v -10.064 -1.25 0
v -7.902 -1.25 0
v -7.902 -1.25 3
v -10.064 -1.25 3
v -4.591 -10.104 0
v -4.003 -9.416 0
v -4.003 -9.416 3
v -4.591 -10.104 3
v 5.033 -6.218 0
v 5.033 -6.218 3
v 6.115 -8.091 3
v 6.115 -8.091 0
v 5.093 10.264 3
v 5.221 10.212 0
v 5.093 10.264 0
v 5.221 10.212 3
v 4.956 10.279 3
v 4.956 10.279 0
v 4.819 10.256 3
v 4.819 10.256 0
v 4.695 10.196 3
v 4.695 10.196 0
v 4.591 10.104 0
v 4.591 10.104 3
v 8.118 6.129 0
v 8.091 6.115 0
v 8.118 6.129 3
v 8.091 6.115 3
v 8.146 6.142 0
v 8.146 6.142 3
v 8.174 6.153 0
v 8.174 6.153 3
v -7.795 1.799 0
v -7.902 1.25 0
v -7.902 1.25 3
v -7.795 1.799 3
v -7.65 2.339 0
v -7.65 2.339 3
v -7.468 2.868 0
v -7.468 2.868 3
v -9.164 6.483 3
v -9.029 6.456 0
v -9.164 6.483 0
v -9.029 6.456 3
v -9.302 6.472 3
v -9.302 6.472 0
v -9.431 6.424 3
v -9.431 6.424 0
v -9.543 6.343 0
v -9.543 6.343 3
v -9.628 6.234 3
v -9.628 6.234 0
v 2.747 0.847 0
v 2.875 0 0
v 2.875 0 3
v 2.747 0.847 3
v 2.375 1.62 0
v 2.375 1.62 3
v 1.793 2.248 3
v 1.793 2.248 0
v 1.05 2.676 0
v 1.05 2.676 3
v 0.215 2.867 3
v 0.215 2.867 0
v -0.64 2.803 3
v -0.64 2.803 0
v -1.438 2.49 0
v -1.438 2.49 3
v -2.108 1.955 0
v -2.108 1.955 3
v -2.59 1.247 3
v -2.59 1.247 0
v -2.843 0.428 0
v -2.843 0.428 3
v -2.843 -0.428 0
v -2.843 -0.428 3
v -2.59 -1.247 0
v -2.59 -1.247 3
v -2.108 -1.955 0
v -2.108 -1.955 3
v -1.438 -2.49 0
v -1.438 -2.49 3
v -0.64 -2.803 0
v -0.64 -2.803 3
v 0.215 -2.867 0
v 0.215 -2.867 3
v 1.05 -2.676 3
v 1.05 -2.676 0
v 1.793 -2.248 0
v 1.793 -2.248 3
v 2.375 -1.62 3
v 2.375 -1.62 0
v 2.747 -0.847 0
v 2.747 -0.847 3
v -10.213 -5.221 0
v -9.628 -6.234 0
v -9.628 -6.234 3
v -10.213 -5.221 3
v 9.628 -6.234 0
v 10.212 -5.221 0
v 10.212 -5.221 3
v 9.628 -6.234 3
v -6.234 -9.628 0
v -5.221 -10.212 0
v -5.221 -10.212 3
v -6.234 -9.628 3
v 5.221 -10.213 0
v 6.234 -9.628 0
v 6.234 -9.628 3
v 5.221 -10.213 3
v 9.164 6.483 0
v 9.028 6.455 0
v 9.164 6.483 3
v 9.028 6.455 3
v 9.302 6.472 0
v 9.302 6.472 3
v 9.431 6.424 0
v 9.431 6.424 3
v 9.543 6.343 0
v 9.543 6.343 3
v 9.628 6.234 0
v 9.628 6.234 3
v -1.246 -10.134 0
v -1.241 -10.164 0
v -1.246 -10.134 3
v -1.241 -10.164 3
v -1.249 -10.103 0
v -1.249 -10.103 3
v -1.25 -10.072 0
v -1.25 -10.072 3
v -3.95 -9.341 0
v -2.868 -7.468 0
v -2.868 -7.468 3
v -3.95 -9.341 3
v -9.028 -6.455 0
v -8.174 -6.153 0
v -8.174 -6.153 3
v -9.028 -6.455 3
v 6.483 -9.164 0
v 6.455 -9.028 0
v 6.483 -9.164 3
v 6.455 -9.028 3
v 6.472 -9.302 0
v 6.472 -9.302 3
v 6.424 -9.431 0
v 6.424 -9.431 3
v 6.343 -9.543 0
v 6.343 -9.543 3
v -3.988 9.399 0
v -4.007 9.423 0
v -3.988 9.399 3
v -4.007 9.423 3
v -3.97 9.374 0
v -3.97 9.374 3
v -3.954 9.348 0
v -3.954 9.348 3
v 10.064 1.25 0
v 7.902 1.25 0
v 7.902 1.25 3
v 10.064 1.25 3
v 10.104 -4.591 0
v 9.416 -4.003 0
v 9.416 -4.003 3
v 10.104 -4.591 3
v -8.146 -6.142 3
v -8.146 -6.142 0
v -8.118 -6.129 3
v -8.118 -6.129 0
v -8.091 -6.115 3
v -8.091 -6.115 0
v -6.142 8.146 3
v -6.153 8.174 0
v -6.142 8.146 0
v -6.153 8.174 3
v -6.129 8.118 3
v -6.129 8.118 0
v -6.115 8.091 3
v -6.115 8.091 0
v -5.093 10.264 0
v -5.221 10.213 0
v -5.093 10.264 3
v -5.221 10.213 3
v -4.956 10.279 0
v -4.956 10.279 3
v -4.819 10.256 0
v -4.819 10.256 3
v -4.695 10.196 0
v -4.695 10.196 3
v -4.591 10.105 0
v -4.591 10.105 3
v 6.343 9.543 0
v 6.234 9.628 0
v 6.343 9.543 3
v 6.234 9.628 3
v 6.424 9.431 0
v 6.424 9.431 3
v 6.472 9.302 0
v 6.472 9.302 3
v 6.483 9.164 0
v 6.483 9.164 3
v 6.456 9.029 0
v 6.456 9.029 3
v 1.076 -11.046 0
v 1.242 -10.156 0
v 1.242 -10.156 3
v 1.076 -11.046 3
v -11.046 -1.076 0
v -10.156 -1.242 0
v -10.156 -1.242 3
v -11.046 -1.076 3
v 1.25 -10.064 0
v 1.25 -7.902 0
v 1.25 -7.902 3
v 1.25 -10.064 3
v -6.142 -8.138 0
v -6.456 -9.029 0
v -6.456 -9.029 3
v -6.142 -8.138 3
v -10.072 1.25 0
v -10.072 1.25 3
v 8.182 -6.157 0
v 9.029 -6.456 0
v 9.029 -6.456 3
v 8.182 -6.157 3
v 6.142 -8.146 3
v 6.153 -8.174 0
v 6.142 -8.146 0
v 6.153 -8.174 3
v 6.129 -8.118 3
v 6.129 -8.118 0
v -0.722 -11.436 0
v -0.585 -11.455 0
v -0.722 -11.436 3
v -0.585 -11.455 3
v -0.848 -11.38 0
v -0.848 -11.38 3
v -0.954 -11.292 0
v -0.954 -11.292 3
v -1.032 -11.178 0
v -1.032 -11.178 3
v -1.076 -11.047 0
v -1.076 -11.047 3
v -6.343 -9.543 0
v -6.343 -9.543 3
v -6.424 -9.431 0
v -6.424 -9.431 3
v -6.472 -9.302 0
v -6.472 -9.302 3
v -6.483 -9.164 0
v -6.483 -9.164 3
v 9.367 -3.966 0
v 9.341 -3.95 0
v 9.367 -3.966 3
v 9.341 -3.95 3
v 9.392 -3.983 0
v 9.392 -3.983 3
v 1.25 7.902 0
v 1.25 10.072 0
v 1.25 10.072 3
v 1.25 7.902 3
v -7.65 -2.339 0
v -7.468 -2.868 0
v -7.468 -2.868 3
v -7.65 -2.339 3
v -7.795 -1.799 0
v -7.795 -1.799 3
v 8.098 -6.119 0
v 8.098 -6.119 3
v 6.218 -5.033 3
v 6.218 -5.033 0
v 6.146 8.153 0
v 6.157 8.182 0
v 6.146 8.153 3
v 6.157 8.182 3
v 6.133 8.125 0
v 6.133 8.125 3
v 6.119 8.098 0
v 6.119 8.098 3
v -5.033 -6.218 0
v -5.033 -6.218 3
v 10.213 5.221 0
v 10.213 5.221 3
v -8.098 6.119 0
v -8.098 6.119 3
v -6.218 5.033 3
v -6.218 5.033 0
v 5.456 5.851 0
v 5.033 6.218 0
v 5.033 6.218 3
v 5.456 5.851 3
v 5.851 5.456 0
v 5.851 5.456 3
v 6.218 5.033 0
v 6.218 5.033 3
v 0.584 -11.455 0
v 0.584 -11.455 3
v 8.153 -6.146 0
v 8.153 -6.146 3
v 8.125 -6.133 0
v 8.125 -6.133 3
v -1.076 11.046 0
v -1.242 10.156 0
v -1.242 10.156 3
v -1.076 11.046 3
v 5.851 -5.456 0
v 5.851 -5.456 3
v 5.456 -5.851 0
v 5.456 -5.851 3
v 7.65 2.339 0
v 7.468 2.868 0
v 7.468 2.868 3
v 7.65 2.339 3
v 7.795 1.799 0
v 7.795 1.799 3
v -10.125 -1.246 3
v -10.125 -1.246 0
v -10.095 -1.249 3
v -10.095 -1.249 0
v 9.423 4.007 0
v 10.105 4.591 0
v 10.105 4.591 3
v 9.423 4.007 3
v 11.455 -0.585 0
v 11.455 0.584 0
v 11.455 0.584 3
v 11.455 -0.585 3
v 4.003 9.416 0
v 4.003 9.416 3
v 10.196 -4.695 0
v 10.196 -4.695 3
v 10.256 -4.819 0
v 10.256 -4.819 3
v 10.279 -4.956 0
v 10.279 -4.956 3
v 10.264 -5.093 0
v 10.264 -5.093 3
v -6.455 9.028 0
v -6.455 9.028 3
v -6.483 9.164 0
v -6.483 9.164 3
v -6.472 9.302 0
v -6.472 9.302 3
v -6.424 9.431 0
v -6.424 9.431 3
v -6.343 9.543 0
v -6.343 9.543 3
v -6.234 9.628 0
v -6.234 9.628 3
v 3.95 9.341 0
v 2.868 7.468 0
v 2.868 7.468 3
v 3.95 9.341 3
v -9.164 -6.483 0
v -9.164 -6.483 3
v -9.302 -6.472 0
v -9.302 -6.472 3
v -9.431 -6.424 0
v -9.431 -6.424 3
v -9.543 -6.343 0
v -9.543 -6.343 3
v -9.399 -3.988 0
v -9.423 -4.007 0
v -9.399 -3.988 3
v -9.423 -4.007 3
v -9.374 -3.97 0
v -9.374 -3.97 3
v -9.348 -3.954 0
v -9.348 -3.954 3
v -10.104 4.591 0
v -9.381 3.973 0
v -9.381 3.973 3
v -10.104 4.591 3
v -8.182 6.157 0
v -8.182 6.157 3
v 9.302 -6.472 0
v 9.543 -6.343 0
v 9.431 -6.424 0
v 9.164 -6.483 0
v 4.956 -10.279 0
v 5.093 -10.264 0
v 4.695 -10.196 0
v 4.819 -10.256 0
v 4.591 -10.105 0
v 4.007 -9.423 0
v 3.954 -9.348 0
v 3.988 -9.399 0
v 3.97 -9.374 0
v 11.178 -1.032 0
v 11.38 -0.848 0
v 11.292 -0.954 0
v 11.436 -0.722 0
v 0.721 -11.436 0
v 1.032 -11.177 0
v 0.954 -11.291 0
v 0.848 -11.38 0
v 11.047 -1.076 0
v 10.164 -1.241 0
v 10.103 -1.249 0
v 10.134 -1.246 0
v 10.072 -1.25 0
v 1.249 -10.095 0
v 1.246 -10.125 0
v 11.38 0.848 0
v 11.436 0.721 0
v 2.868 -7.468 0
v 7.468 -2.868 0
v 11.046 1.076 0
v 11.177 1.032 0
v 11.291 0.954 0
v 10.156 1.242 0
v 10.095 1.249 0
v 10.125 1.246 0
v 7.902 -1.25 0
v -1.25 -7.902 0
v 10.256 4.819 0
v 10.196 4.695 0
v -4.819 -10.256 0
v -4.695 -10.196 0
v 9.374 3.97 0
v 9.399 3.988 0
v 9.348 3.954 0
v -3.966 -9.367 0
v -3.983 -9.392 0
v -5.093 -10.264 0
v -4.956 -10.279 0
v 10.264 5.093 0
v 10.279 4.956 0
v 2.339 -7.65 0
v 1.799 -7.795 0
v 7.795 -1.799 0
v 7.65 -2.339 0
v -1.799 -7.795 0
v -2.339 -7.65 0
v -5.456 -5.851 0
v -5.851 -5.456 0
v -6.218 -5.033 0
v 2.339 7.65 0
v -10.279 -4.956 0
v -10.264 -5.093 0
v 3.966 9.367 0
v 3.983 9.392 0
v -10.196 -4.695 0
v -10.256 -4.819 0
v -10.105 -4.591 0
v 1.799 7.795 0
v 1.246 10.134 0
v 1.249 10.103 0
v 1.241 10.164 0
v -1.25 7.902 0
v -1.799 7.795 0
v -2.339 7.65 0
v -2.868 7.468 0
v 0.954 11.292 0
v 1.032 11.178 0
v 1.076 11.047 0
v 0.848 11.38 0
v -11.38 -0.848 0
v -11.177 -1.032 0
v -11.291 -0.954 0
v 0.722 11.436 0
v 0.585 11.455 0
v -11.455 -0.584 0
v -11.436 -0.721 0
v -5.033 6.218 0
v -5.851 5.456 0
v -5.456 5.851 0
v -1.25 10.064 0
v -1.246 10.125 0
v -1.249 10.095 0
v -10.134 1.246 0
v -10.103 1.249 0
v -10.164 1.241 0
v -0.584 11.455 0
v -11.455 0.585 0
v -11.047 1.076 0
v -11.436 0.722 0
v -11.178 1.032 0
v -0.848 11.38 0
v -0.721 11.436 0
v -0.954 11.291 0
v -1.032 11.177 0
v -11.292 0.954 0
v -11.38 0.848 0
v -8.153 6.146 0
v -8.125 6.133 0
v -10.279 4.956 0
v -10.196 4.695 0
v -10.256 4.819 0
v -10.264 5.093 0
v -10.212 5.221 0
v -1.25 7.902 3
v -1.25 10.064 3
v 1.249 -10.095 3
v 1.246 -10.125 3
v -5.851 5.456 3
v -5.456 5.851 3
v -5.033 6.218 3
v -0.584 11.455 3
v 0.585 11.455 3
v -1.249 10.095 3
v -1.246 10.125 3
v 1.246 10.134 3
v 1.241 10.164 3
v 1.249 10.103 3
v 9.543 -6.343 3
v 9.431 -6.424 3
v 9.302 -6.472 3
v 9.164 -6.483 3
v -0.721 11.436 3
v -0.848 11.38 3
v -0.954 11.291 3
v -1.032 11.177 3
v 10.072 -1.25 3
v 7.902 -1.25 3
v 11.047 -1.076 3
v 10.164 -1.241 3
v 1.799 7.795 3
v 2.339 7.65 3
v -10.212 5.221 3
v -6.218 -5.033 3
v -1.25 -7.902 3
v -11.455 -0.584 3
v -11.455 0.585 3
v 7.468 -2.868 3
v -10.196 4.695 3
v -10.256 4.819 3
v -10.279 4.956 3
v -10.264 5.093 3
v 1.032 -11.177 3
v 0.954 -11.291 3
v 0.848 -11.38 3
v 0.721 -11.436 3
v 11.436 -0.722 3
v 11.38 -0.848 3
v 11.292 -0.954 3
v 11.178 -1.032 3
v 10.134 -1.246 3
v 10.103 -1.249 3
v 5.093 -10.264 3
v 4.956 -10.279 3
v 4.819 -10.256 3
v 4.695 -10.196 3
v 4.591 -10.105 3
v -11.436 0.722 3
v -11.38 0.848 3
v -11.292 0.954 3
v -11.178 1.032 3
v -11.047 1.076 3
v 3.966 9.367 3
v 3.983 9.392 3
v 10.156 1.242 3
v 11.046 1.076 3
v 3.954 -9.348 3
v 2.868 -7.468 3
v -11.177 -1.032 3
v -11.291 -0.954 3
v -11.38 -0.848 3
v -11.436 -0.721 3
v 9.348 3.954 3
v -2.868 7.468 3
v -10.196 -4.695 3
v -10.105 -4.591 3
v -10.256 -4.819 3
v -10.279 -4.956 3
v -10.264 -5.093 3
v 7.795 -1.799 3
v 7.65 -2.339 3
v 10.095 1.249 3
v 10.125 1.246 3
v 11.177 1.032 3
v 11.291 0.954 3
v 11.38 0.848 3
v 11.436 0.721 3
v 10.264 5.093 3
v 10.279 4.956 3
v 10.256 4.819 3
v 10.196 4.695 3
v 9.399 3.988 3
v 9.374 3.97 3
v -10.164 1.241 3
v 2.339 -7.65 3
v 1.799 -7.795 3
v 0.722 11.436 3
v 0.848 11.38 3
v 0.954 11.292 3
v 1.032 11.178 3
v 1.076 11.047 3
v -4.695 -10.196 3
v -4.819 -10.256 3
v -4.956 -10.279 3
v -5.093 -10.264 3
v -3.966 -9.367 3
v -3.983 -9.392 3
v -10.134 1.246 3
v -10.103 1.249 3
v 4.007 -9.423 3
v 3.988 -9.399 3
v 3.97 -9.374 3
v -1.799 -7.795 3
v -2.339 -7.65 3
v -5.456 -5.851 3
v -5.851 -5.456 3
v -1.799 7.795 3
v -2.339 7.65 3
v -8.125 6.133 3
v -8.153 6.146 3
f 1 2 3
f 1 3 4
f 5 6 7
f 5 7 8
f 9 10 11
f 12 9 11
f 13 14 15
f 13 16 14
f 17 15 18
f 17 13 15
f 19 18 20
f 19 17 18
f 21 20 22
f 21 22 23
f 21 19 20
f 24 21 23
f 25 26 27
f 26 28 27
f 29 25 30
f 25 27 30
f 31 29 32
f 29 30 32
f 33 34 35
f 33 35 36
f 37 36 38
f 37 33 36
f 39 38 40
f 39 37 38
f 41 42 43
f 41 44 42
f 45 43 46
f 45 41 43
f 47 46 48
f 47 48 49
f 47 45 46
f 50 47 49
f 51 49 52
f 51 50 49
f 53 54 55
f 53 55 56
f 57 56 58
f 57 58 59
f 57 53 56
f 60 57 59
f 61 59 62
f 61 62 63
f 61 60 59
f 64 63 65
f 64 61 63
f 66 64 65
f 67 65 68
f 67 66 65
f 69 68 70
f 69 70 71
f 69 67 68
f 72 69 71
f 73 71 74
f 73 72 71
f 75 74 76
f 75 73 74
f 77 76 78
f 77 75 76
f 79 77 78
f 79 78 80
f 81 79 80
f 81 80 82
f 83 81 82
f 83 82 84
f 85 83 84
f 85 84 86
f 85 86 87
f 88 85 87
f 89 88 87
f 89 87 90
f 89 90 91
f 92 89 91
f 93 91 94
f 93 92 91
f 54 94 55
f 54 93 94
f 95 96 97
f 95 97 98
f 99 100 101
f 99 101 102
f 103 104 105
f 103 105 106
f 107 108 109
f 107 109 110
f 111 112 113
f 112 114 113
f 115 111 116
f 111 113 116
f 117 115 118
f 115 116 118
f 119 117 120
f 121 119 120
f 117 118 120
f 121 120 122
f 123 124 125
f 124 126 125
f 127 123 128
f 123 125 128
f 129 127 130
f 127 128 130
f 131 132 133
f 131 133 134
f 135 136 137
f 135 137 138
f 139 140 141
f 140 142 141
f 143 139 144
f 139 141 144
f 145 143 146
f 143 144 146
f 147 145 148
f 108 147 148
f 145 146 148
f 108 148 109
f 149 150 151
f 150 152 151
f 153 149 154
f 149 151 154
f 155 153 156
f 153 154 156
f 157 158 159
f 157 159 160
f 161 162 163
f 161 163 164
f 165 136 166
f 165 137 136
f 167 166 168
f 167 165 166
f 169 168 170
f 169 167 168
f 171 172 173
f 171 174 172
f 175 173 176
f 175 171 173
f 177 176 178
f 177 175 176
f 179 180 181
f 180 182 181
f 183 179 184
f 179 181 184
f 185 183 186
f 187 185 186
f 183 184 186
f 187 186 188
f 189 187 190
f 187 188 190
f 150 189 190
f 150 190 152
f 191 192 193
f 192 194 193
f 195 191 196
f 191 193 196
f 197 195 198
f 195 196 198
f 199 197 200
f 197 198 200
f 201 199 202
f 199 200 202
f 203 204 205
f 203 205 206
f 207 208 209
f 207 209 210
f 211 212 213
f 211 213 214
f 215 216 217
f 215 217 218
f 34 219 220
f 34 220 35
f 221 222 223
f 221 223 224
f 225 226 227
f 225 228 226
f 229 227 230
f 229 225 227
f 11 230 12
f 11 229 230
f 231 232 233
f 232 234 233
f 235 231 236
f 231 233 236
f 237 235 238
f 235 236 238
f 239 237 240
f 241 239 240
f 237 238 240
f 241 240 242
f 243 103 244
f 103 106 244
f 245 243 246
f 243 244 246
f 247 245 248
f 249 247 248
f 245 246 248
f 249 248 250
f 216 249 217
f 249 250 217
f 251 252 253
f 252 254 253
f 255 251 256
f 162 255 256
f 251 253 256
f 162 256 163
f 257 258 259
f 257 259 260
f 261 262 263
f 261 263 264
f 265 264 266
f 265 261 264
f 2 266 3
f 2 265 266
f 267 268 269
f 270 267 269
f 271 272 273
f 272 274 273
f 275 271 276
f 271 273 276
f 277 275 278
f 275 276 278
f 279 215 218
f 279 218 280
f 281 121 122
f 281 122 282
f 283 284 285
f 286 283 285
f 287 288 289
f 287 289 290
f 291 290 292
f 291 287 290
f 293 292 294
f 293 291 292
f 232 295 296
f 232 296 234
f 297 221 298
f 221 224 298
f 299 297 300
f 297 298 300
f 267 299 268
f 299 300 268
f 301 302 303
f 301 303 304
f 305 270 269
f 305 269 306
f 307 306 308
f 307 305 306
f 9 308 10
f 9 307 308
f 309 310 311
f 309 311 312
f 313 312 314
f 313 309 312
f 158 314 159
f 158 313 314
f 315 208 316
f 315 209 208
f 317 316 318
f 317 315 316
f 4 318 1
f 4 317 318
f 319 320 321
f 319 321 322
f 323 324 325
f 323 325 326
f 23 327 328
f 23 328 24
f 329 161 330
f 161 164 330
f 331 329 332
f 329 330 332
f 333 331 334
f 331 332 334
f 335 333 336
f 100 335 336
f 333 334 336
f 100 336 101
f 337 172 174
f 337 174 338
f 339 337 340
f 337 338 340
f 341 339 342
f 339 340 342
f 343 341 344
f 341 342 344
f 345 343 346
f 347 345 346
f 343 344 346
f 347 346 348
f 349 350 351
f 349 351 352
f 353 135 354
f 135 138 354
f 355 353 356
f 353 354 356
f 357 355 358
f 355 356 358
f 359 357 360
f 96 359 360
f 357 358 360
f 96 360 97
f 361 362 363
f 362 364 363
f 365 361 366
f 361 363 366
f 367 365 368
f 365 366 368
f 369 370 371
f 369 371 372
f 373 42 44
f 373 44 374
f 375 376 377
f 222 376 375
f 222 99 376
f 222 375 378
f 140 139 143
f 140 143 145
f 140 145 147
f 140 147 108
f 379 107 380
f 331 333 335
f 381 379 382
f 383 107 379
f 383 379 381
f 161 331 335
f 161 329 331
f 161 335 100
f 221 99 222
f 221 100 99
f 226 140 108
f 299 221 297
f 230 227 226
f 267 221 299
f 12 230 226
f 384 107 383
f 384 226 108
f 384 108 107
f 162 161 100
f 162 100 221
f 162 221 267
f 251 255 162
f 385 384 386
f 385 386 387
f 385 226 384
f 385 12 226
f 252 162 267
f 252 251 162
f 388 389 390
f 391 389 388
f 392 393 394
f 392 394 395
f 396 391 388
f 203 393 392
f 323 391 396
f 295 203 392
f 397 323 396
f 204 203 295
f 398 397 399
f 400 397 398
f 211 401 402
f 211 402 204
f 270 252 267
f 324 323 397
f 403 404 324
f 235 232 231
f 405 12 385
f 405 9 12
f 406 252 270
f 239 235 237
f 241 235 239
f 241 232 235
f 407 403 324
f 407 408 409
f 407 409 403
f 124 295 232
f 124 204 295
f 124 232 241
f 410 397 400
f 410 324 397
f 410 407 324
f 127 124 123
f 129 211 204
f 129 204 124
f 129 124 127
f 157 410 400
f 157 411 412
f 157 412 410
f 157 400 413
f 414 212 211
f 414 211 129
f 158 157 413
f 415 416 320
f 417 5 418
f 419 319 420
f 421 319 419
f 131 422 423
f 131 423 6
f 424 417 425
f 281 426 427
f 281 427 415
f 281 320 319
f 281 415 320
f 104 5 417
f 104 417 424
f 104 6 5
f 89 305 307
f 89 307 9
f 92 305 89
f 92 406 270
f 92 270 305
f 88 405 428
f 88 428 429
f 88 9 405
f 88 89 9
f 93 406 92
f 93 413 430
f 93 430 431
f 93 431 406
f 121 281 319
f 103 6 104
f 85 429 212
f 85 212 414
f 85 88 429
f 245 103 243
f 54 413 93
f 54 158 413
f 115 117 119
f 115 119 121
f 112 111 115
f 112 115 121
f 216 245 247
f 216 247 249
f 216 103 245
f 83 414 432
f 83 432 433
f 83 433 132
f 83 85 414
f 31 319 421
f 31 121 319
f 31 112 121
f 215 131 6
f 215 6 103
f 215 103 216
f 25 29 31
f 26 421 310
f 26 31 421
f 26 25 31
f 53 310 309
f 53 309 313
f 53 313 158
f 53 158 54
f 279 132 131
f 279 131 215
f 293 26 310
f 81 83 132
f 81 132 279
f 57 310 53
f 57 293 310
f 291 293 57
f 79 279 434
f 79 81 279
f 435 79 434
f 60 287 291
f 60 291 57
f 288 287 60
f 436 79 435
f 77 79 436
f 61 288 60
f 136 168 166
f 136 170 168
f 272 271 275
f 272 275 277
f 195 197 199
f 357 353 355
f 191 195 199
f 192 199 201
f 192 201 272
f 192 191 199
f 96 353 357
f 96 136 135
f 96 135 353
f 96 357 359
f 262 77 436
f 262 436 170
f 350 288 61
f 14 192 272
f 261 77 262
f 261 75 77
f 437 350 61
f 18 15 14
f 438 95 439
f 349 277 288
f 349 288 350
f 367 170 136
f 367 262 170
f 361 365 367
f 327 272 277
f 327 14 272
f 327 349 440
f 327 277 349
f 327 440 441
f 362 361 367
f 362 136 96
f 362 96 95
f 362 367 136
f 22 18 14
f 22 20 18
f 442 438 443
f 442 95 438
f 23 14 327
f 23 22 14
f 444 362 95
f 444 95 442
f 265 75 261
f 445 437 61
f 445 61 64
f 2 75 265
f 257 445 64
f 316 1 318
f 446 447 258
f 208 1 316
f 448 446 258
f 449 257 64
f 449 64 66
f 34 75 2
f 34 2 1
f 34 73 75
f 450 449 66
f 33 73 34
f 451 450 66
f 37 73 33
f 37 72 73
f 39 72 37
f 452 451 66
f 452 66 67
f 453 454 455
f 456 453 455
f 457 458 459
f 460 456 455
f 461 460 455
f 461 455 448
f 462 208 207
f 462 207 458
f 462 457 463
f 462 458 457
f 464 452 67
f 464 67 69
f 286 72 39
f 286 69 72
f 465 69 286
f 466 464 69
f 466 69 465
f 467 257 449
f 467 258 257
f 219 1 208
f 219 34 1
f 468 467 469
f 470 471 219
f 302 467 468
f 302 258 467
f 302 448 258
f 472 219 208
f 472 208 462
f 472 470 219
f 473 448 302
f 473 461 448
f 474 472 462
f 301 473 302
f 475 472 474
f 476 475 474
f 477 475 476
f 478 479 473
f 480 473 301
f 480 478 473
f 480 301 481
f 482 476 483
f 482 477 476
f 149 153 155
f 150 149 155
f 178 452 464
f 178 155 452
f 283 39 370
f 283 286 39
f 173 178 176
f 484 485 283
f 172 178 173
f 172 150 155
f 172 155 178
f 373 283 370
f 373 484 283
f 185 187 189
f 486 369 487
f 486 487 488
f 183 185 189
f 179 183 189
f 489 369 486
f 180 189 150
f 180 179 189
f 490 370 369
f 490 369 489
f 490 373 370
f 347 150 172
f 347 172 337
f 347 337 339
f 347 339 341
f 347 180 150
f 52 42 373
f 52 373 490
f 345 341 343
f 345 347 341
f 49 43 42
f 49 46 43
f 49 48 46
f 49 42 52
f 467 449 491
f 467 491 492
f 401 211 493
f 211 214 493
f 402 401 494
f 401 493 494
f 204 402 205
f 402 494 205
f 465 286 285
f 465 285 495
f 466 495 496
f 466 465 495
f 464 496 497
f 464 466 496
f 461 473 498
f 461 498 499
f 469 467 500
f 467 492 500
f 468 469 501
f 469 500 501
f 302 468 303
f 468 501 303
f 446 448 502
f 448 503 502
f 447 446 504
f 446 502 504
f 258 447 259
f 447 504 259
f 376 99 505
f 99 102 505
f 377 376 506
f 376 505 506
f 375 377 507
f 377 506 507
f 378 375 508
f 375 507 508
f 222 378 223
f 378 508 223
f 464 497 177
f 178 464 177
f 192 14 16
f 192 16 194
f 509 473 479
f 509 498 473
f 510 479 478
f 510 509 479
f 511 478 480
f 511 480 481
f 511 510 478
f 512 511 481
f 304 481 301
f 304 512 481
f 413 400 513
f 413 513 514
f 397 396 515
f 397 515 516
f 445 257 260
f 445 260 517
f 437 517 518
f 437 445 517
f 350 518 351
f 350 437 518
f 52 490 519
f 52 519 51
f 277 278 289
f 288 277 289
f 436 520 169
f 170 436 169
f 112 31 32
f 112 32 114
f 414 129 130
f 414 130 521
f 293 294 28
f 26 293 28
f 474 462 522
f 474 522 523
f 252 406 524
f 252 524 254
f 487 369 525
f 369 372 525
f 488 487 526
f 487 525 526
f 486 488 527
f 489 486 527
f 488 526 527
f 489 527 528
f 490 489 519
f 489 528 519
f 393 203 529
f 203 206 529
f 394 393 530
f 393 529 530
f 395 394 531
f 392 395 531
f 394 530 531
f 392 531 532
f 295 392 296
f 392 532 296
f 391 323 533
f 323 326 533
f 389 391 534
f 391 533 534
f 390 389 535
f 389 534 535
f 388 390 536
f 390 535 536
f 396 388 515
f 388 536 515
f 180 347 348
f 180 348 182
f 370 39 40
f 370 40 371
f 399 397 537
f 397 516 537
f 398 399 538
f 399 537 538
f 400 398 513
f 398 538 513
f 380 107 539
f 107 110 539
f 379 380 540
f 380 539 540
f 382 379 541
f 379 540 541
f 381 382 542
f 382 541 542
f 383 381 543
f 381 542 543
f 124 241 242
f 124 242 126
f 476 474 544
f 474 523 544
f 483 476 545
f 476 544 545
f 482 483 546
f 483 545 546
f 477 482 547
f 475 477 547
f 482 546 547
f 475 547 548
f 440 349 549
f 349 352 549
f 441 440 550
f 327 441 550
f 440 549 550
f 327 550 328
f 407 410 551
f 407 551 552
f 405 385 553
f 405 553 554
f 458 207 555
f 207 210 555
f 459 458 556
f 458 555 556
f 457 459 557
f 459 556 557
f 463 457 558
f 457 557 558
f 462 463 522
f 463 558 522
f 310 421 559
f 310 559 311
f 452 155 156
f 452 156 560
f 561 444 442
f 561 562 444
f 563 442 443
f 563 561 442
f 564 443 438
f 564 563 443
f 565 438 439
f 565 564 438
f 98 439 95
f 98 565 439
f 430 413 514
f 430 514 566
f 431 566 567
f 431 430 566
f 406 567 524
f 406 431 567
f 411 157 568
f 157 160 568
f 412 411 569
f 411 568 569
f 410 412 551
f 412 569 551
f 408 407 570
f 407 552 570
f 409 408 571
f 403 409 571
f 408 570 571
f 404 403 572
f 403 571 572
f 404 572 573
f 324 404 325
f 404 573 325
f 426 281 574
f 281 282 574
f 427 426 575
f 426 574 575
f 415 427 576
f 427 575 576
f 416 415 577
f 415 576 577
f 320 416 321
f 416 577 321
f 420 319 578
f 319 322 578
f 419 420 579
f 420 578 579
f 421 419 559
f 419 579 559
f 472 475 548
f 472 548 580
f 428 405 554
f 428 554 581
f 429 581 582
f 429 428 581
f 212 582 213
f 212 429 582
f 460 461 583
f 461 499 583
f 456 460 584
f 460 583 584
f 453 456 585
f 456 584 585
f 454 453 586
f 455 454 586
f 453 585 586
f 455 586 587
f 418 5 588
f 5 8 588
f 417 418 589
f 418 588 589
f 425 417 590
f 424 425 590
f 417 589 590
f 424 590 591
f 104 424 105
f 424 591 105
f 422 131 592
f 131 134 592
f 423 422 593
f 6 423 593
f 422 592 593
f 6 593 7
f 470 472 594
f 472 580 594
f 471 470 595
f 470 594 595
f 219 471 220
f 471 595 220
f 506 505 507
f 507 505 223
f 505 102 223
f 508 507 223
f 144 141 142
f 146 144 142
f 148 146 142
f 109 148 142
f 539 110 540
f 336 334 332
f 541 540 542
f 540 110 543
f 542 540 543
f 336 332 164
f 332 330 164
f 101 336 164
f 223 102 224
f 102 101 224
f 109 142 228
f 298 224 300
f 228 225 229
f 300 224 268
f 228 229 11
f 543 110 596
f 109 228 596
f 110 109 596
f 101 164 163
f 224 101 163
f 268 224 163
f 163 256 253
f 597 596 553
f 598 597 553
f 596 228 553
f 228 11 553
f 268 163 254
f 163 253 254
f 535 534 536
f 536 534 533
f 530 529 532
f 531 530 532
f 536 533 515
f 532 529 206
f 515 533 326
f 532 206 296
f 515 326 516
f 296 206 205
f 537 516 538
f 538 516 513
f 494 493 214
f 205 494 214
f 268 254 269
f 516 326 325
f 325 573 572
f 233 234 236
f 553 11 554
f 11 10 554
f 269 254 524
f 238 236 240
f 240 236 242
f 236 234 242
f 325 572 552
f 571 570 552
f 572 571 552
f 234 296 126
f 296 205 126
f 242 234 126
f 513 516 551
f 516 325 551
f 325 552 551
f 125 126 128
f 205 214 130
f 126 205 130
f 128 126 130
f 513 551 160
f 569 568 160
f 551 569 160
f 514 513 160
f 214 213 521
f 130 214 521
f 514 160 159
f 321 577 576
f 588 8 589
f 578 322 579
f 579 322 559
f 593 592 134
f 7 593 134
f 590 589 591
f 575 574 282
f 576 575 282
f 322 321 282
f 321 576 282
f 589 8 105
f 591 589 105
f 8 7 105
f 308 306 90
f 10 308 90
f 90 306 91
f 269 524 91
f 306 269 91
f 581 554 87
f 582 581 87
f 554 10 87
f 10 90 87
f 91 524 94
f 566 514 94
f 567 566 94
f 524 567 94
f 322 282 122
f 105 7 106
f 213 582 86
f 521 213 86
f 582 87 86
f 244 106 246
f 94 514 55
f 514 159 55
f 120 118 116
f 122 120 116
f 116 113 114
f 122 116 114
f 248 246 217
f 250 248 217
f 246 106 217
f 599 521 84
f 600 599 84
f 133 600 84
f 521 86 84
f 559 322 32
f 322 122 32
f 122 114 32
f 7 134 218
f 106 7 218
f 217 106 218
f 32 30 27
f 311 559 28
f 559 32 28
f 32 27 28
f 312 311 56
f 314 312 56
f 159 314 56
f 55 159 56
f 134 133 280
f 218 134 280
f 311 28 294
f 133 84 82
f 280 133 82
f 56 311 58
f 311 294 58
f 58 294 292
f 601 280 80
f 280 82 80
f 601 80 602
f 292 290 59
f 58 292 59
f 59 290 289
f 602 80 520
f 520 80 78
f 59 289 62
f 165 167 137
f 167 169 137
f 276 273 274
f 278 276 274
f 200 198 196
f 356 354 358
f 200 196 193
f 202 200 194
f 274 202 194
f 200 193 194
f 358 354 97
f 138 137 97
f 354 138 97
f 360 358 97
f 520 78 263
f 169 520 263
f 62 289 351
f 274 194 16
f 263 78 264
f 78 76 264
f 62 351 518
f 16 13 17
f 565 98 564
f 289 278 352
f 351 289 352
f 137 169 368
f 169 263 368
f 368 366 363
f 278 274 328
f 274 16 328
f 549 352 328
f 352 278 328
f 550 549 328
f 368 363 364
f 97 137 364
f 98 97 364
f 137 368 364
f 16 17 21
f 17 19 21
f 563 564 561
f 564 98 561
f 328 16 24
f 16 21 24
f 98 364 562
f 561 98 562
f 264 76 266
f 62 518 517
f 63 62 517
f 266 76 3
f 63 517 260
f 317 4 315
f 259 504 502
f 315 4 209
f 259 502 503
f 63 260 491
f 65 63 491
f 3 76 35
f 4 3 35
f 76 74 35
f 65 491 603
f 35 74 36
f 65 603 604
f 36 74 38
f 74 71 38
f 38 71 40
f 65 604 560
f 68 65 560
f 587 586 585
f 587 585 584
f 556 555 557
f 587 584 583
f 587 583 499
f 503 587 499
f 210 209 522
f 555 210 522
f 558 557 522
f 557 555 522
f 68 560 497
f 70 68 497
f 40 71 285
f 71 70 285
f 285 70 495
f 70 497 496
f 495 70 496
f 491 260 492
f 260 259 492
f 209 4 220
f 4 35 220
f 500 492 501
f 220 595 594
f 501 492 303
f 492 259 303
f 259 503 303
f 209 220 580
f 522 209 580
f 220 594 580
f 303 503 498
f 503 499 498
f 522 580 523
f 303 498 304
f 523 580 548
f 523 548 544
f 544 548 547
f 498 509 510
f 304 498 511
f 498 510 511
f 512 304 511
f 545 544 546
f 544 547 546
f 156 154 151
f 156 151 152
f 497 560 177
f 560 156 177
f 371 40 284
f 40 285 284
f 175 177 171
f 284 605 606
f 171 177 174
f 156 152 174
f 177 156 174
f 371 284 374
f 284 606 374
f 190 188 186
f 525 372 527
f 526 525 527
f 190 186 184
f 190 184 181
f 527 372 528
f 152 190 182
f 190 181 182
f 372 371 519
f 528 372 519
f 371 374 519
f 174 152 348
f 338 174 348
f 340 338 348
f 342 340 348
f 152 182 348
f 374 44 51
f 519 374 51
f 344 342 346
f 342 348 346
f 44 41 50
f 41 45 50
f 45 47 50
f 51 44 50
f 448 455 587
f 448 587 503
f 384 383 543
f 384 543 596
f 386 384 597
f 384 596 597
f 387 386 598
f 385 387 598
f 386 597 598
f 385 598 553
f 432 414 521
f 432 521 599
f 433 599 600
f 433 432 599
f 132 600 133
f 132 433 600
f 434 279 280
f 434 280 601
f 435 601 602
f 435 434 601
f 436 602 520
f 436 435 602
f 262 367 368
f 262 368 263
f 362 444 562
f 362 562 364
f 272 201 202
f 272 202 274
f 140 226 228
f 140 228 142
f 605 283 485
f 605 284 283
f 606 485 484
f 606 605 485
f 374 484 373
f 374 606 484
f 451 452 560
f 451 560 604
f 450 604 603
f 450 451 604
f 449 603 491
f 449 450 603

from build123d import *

# Parameters (mm, degrees)
SKETCH1_R           = 2.875
BOSS_EXTRUDE1_DEPTH = 3
FILLET1_R           = 0.5
FILLET2_R           = 0.5
FILLET3_R           = 0.5
FILLET4_R           = 0.5
FILLET5_R           = 0.5
FILLET6_R           = 0.5
FILLET7_R           = 0.5
FILLET8_R           = 0.5
FILLET9_R           = 0.5
FILLET10_R          = 0.5
FILLET11_R          = 0.5
FILLET12_R          = 0.5
FILLET13_R          = 0.5
FILLET14_R          = 0.5
FILLET15_R          = 0.5
FILLET16_R          = 0.5
FILLET17_R          = 0.5
FILLET18_R          = 0.5
FILLET19_R          = 0.5
FILLET20_R          = 0.5
FILLET21_R          = 0.5
FILLET22_R          = 0.5
FILLET23_R          = 0.5
FILLET24_R          = 0.5
FILLET25_R          = 0.5
FILLET26_R          = 0.5
FILLET27_R          = 0.5
FILLET28_R          = 0.5
FILLET29_R          = 0.5
FILLET30_R          = 0.5
FILLET31_R          = 0.5
FILLET32_R          = 0.5
FILLET33_R          = 0.5
FILLET34_R          = 0.5
FILLET35_R          = 0.5
FILLET36_R          = 0.5
FILLET41_R          = 0.5
FILLET42_R          = 0.5
FILLET43_R          = 0.5
FILLET44_R          = 0.5
FILLET45_R          = 0.5
FILLET46_R          = 0.5
FILLET47_R          = 0.5
FILLET48_R          = 0.5


with BuildPart() as part:
    # Sketch1 → Boss-Extrude1 (new body)
    with BuildSketch(Plane.XY):
        with BuildLine():
            Line((-1, 11.454813213), (1, 11.454813213))
            Line((1, 11.454813213), (1.25, 10.118734291))
            Line((1.25, 10.118734291), (1.25, 7.901740315))
            ThreePointArc((1.25, 7.901740315), (2.070552361, 7.72740661), (2.868338403, 7.468107847))
            Line((2.868338403, 7.468107847), (3.972583989, 9.380717307))
            Line((3.972583989, 9.380717307), (4.861381203, 10.420159238))
            Line((4.861381203, 10.420159238), (6.59343201, 9.420159238))
            Line((6.59343201, 9.420159238), (6.1418989, 8.13808095))
            Line((6.1418989, 8.13808095), (5.033401912, 6.218107847))
            ThreePointArc((5.033401912, 6.218107847), (5.656854249, 5.656854249), (6.218107847, 5.033401912))
            Line((6.218107847, 5.033401912), (8.130717307, 6.137647499))
            Line((8.130717307, 6.137647499), (9.420159238, 6.59343201))
            Line((9.420159238, 6.59343201), (10.420159238, 4.861381203))
            Line((10.420159238, 4.861381203), (9.38808095, 3.976835391))
            Line((9.38808095, 3.976835391), (7.468107847, 2.868338403))
            ThreePointArc((7.468107847, 2.868338403), (7.72740661, 2.070552361), (7.901740315, 1.25))
            Line((7.901740315, 1.25), (10.110231488, 1.25))
            Line((10.110231488, 1.25), (11.454813213, 1))
            Line((11.454813213, 1), (11.454813213, -1))
            Line((11.454813213, -1), (10.118734291, -1.25))
            Line((10.118734291, -1.25), (7.901740315, -1.25))
            ThreePointArc((7.901740315, -1.25), (7.72740661, -2.070552361), (7.468107847, -2.868338403))
            Line((7.468107847, -2.868338403), (9.380717307, -3.972583989))
            Line((9.380717307, -3.972583989), (10.420159238, -4.861381203))
            Line((10.420159238, -4.861381203), (9.420159238, -6.59343201))
            Line((9.420159238, -6.59343201), (8.13808095, -6.1418989))
            Line((8.13808095, -6.1418989), (6.218107847, -5.033401912))
            ThreePointArc((6.218107847, -5.033401912), (5.656854249, -5.656854249), (5.033401912, -6.218107847))
            Line((5.033401912, -6.218107847), (6.137647499, -8.130717307))
            Line((6.137647499, -8.130717307), (6.59343201, -9.420159238))
            Line((6.59343201, -9.420159238), (4.861381203, -10.420159238))
            Line((4.861381203, -10.420159238), (3.976835391, -9.38808095))
            Line((3.976835391, -9.38808095), (2.868338403, -7.468107847))
            ThreePointArc((2.868338403, -7.468107847), (2.070552361, -7.72740661), (1.25, -7.901740315))
            Line((1.25, -7.901740315), (1.25, -10.110231488))
            Line((1.25, -10.110231488), (1, -11.454813213))
            Line((1, -11.454813213), (-1, -11.454813213))
            Line((-1, -11.454813213), (-1.25, -10.118734291))
            Line((-1.25, -10.118734291), (-1.25, -7.901740315))
            ThreePointArc((-1.25, -7.901740315), (-2.070552361, -7.72740661), (-2.868338403, -7.468107847))
            Line((-2.868338403, -7.468107847), (-3.972583989, -9.380717307))
            Line((-3.972583989, -9.380717307), (-4.861381203, -10.420159238))
            Line((-4.861381203, -10.420159238), (-6.59343201, -9.420159238))
            Line((-6.59343201, -9.420159238), (-6.1418989, -8.13808095))
            Line((-6.1418989, -8.13808095), (-5.033401912, -6.218107847))
            ThreePointArc((-5.033401912, -6.218107847), (-5.656854249, -5.656854249), (-6.218107847, -5.033401912))
            Line((-6.218107847, -5.033401912), (-8.130717307, -6.137647499))
            Line((-8.130717307, -6.137647499), (-9.420159238, -6.59343201))
            Line((-9.420159238, -6.59343201), (-10.420159238, -4.861381203))
            Line((-10.420159238, -4.861381203), (-9.38808095, -3.976835391))
            Line((-9.38808095, -3.976835391), (-7.468107847, -2.868338403))
            ThreePointArc((-7.468107847, -2.868338403), (-7.72740661, -2.070552361), (-7.901740315, -1.25))
            Line((-7.901740315, -1.25), (-10.110231488, -1.25))
            Line((-10.110231488, -1.25), (-11.454813213, -1))
            Line((-11.454813213, -1), (-11.454813213, 1))
            Line((-11.454813213, 1), (-10.118734291, 1.25))
            Line((-10.118734291, 1.25), (-7.901740315, 1.25))
            ThreePointArc((-7.901740315, 1.25), (-7.72740661, 2.070552361), (-7.468107847, 2.868338403))
            Line((-7.468107847, 2.868338403), (-9.380717307, 3.972583989))
            Line((-9.380717307, 3.972583989), (-10.420159238, 4.861381203))
            Line((-10.420159238, 4.861381203), (-9.420159238, 6.59343201))
            Line((-9.420159238, 6.59343201), (-8.13808095, 6.1418989))
            Line((-8.13808095, 6.1418989), (-6.218107847, 5.033401912))
            ThreePointArc((-6.218107847, 5.033401912), (-5.656854249, 5.656854249), (-5.033401912, 6.218107847))
            Line((-5.033401912, 6.218107847), (-6.137647499, 8.130717307))
            Line((-6.137647499, 8.130717307), (-6.59343201, 9.420159238))
            Line((-6.59343201, 9.420159238), (-4.861381203, 10.420159238))
            Line((-4.861381203, 10.420159238), (-3.976835391, 9.38808095))
            Line((-3.976835391, 9.38808095), (-2.868338403, 7.468107847))
            ThreePointArc((-2.868338403, 7.468107847), (-2.070552361, 7.72740661), (-1.25, 7.901740315))
            Line((-1.25, 7.901740315), (-1.25, 10.110231488))
            Line((-1.25, 10.110231488), (-1, 11.454813213))
        make_face()
        Circle(SKETCH1_R, mode=Mode.SUBTRACT)
    extrude(amount=BOSS_EXTRUDE1_DEPTH)

    # Fillet1
    fillet1_edges = [part.edges().sort_by_distance(p)[0] for p in [
        (1, 11.454813213, 1.5),
    ]]
    fillet(fillet1_edges, radius=FILLET1_R)

    # Fillet2
    fillet2_edges = [part.edges().sort_by_distance(p)[0] for p in [
        (-1, 11.454813213, 1.5),
    ]]
    fillet(fillet2_edges, radius=FILLET2_R)

    # Fillet3
    fillet3_edges = [part.edges().sort_by_distance(p)[0] for p in [
        (6.59343201, 9.420159238, 1.5),
    ]]
    fillet(fillet3_edges, radius=FILLET3_R)

    # Fillet4
    fillet4_edges = [part.edges().sort_by_distance(p)[0] for p in [
        (4.861381203, 10.420159238, 1.5),
    ]]
    fillet(fillet4_edges, radius=FILLET4_R)

    # Fillet5
    fillet5_edges = [part.edges().sort_by_distance(p)[0] for p in [
        (9.420159238, 6.59343201, 1.5),
    ]]
    fillet(fillet5_edges, radius=FILLET5_R)

    # Fillet6
    fillet6_edges = [part.edges().sort_by_distance(p)[0] for p in [
        (10.420159238, 4.861381203, 1.5),
    ]]
    fillet(fillet6_edges, radius=FILLET6_R)

    # Fillet7
    fillet7_edges = [part.edges().sort_by_distance(p)[0] for p in [
        (11.454813213, 1, 1.5),
    ]]
    fillet(fillet7_edges, radius=FILLET7_R)

    # Fillet8
    fillet8_edges = [part.edges().sort_by_distance(p)[0] for p in [
        (11.454813213, -1, 1.5),
    ]]
    fillet(fillet8_edges, radius=FILLET8_R)

    # Fillet9
    fillet9_edges = [part.edges().sort_by_distance(p)[0] for p in [
        (10.420159238, -4.861381203, 1.5),
    ]]
    fillet(fillet9_edges, radius=FILLET9_R)

    # Fillet10
    fillet10_edges = [part.edges().sort_by_distance(p)[0] for p in [
        (9.420159238, -6.59343201, 1.5),
    ]]
    fillet(fillet10_edges, radius=FILLET10_R)

    # Fillet11
    fillet11_edges = [part.edges().sort_by_distance(p)[0] for p in [
        (6.59343201, -9.420159238, 1.5),
    ]]
    fillet(fillet11_edges, radius=FILLET11_R)

    # Fillet12
    fillet12_edges = [part.edges().sort_by_distance(p)[0] for p in [
        (4.861381203, -10.420159238, 1.5),
    ]]
    fillet(fillet12_edges, radius=FILLET12_R)

    # Fillet13
    fillet13_edges = [part.edges().sort_by_distance(p)[0] for p in [
        (1, -11.454813213, 1.5),
    ]]
    fillet(fillet13_edges, radius=FILLET13_R)

    # Fillet14
    fillet14_edges = [part.edges().sort_by_distance(p)[0] for p in [
        (-1, -11.454813213, 1.5),
    ]]
    fillet(fillet14_edges, radius=FILLET14_R)

    # Fillet15
    fillet15_edges = [part.edges().sort_by_distance(p)[0] for p in [
        (-4.861381203, -10.420159238, 1.5),
    ]]
    fillet(fillet15_edges, radius=FILLET15_R)

    # Fillet16
    fillet16_edges = [part.edges().sort_by_distance(p)[0] for p in [
        (-6.59343201, -9.420159238, 1.5),
    ]]
    fillet(fillet16_edges, radius=FILLET16_R)

    # Fillet17
    fillet17_edges = [part.edges().sort_by_distance(p)[0] for p in [
        (-9.420159238, -6.59343201, 1.5),
    ]]
    fillet(fillet17_edges, radius=FILLET17_R)

    # Fillet18
    fillet18_edges = [part.edges().sort_by_distance(p)[0] for p in [
        (-11.454813213, 1, 1.5),
    ]]
    fillet(fillet18_edges, radius=FILLET18_R)

    # Fillet19
    fillet19_edges = [part.edges().sort_by_distance(p)[0] for p in [
        (-10.420159238, 4.861381203, 1.5),
    ]]
    fillet(fillet19_edges, radius=FILLET19_R)

    # Fillet20
    fillet20_edges = [part.edges().sort_by_distance(p)[0] for p in [
        (-4.861381203, 10.420159238, 1.5),
    ]]
    fillet(fillet20_edges, radius=FILLET20_R)

    # Fillet21
    fillet21_edges = [part.edges().sort_by_distance(p)[0] for p in [
        (-1.25, 10.110231488, 1.5),
    ]]
    fillet(fillet21_edges, radius=FILLET21_R)

    # Fillet22
    fillet22_edges = [part.edges().sort_by_distance(p)[0] for p in [
        (1.25, 10.118734291, 1.5),
    ]]
    fillet(fillet22_edges, radius=FILLET22_R)

    # Fillet23
    fillet23_edges = [part.edges().sort_by_distance(p)[0] for p in [
        (3.972583989, 9.380717307, 1.5),
    ]]
    fillet(fillet23_edges, radius=FILLET23_R)

    # Fillet24
    fillet24_edges = [part.edges().sort_by_distance(p)[0] for p in [
        (6.1418989, 8.13808095, 1.5),
    ]]
    fillet(fillet24_edges, radius=FILLET24_R)

    # Fillet25
    fillet25_edges = [part.edges().sort_by_distance(p)[0] for p in [
        (8.130717307, 6.137647499, 1.5),
    ]]
    fillet(fillet25_edges, radius=FILLET25_R)

    # Fillet26
    fillet26_edges = [part.edges().sort_by_distance(p)[0] for p in [
        (9.38808095, 3.976835391, 1.5),
    ]]
    fillet(fillet26_edges, radius=FILLET26_R)

    # Fillet27
    fillet27_edges = [part.edges().sort_by_distance(p)[0] for p in [
        (10.110231488, 1.25, 1.5),
    ]]
    fillet(fillet27_edges, radius=FILLET27_R)

    # Fillet28
    fillet28_edges = [part.edges().sort_by_distance(p)[0] for p in [
        (10.118734291, -1.25, 1.5),
    ]]
    fillet(fillet28_edges, radius=FILLET28_R)

    # Fillet29
    fillet29_edges = [part.edges().sort_by_distance(p)[0] for p in [
        (9.380717307, -3.972583989, 1.5),
    ]]
    fillet(fillet29_edges, radius=FILLET29_R)

    # Fillet30
    fillet30_edges = [part.edges().sort_by_distance(p)[0] for p in [
        (8.13808095, -6.1418989, 1.5),
    ]]
    fillet(fillet30_edges, radius=FILLET30_R)

    # Fillet31
    fillet31_edges = [part.edges().sort_by_distance(p)[0] for p in [
        (3.976835391, -9.38808095, 1.5),
    ]]
    fillet(fillet31_edges, radius=FILLET31_R)

    # Fillet32
    fillet32_edges = [part.edges().sort_by_distance(p)[0] for p in [
        (6.137647499, -8.130717307, 1.5),
    ]]
    fillet(fillet32_edges, radius=FILLET32_R)

    # Fillet33
    fillet33_edges = [part.edges().sort_by_distance(p)[0] for p in [
        (1.25, -10.110231488, 1.5),
    ]]
    fillet(fillet33_edges, radius=FILLET33_R)

    # Fillet34
    fillet34_edges = [part.edges().sort_by_distance(p)[0] for p in [
        (-1.25, -10.118734291, 1.5),
        (-3.972583989, -9.380717307, 1.5),
    ]]
    fillet(fillet34_edges, radius=FILLET34_R)

    # Fillet35
    fillet35_edges = [part.edges().sort_by_distance(p)[0] for p in [
        (-9.38808095, -3.976835391, 1.5),
    ]]
    fillet(fillet35_edges, radius=FILLET35_R)

    # Fillet36
    fillet36_edges = [part.edges().sort_by_distance(p)[0] for p in [
        (-8.130717307, -6.137647499, 1.5),
        (-11.454813213, -1, 1.5),
    ]]
    fillet(fillet36_edges, radius=FILLET36_R)

    # Fillet41
    fillet41_edges = [part.edges().sort_by_distance(p)[0] for p in [
        (-6.59343201, 9.420159238, 1.5),
    ]]
    fillet(fillet41_edges, radius=FILLET41_R)

    # Fillet42
    fillet42_edges = [part.edges().sort_by_distance(p)[0] for p in [
        (-6.137647499, 8.130717307, 1.5),
    ]]
    fillet(fillet42_edges, radius=FILLET42_R)

    # Fillet43
    fillet43_edges = [part.edges().sort_by_distance(p)[0] for p in [
        (-8.13808095, 6.1418989, 1.5),
    ]]
    fillet(fillet43_edges, radius=FILLET43_R)

    # Fillet44
    fillet44_edges = [part.edges().sort_by_distance(p)[0] for p in [
        (-9.420159238, 6.59343201, 1.5),
    ]]
    fillet(fillet44_edges, radius=FILLET44_R)

    # Fillet45
    fillet45_edges = [part.edges().sort_by_distance(p)[0] for p in [
        (-3.976835391, 9.38808095, 1.5),
    ]]
    fillet(fillet45_edges, radius=FILLET45_R)

    # Fillet46
    fillet46_edges = [part.edges().sort_by_distance(p)[0] for p in [
        (-10.420159238, -4.861381203, 1.5),
    ]]
    fillet(fillet46_edges, radius=FILLET46_R)

    # Fillet47
    fillet47_edges = [part.edges().sort_by_distance(p)[0] for p in [
        (-10.118734291, 1.25, 1.5),
    ]]
    fillet(fillet47_edges, radius=FILLET47_R)

    # Fillet48
    fillet48_edges = [part.edges().sort_by_distance(p)[0] for p in [
        (-10.110231488, -1.25, 1.5),
    ]]
    fillet(fillet48_edges, radius=FILLET48_R)


solid = part.part
